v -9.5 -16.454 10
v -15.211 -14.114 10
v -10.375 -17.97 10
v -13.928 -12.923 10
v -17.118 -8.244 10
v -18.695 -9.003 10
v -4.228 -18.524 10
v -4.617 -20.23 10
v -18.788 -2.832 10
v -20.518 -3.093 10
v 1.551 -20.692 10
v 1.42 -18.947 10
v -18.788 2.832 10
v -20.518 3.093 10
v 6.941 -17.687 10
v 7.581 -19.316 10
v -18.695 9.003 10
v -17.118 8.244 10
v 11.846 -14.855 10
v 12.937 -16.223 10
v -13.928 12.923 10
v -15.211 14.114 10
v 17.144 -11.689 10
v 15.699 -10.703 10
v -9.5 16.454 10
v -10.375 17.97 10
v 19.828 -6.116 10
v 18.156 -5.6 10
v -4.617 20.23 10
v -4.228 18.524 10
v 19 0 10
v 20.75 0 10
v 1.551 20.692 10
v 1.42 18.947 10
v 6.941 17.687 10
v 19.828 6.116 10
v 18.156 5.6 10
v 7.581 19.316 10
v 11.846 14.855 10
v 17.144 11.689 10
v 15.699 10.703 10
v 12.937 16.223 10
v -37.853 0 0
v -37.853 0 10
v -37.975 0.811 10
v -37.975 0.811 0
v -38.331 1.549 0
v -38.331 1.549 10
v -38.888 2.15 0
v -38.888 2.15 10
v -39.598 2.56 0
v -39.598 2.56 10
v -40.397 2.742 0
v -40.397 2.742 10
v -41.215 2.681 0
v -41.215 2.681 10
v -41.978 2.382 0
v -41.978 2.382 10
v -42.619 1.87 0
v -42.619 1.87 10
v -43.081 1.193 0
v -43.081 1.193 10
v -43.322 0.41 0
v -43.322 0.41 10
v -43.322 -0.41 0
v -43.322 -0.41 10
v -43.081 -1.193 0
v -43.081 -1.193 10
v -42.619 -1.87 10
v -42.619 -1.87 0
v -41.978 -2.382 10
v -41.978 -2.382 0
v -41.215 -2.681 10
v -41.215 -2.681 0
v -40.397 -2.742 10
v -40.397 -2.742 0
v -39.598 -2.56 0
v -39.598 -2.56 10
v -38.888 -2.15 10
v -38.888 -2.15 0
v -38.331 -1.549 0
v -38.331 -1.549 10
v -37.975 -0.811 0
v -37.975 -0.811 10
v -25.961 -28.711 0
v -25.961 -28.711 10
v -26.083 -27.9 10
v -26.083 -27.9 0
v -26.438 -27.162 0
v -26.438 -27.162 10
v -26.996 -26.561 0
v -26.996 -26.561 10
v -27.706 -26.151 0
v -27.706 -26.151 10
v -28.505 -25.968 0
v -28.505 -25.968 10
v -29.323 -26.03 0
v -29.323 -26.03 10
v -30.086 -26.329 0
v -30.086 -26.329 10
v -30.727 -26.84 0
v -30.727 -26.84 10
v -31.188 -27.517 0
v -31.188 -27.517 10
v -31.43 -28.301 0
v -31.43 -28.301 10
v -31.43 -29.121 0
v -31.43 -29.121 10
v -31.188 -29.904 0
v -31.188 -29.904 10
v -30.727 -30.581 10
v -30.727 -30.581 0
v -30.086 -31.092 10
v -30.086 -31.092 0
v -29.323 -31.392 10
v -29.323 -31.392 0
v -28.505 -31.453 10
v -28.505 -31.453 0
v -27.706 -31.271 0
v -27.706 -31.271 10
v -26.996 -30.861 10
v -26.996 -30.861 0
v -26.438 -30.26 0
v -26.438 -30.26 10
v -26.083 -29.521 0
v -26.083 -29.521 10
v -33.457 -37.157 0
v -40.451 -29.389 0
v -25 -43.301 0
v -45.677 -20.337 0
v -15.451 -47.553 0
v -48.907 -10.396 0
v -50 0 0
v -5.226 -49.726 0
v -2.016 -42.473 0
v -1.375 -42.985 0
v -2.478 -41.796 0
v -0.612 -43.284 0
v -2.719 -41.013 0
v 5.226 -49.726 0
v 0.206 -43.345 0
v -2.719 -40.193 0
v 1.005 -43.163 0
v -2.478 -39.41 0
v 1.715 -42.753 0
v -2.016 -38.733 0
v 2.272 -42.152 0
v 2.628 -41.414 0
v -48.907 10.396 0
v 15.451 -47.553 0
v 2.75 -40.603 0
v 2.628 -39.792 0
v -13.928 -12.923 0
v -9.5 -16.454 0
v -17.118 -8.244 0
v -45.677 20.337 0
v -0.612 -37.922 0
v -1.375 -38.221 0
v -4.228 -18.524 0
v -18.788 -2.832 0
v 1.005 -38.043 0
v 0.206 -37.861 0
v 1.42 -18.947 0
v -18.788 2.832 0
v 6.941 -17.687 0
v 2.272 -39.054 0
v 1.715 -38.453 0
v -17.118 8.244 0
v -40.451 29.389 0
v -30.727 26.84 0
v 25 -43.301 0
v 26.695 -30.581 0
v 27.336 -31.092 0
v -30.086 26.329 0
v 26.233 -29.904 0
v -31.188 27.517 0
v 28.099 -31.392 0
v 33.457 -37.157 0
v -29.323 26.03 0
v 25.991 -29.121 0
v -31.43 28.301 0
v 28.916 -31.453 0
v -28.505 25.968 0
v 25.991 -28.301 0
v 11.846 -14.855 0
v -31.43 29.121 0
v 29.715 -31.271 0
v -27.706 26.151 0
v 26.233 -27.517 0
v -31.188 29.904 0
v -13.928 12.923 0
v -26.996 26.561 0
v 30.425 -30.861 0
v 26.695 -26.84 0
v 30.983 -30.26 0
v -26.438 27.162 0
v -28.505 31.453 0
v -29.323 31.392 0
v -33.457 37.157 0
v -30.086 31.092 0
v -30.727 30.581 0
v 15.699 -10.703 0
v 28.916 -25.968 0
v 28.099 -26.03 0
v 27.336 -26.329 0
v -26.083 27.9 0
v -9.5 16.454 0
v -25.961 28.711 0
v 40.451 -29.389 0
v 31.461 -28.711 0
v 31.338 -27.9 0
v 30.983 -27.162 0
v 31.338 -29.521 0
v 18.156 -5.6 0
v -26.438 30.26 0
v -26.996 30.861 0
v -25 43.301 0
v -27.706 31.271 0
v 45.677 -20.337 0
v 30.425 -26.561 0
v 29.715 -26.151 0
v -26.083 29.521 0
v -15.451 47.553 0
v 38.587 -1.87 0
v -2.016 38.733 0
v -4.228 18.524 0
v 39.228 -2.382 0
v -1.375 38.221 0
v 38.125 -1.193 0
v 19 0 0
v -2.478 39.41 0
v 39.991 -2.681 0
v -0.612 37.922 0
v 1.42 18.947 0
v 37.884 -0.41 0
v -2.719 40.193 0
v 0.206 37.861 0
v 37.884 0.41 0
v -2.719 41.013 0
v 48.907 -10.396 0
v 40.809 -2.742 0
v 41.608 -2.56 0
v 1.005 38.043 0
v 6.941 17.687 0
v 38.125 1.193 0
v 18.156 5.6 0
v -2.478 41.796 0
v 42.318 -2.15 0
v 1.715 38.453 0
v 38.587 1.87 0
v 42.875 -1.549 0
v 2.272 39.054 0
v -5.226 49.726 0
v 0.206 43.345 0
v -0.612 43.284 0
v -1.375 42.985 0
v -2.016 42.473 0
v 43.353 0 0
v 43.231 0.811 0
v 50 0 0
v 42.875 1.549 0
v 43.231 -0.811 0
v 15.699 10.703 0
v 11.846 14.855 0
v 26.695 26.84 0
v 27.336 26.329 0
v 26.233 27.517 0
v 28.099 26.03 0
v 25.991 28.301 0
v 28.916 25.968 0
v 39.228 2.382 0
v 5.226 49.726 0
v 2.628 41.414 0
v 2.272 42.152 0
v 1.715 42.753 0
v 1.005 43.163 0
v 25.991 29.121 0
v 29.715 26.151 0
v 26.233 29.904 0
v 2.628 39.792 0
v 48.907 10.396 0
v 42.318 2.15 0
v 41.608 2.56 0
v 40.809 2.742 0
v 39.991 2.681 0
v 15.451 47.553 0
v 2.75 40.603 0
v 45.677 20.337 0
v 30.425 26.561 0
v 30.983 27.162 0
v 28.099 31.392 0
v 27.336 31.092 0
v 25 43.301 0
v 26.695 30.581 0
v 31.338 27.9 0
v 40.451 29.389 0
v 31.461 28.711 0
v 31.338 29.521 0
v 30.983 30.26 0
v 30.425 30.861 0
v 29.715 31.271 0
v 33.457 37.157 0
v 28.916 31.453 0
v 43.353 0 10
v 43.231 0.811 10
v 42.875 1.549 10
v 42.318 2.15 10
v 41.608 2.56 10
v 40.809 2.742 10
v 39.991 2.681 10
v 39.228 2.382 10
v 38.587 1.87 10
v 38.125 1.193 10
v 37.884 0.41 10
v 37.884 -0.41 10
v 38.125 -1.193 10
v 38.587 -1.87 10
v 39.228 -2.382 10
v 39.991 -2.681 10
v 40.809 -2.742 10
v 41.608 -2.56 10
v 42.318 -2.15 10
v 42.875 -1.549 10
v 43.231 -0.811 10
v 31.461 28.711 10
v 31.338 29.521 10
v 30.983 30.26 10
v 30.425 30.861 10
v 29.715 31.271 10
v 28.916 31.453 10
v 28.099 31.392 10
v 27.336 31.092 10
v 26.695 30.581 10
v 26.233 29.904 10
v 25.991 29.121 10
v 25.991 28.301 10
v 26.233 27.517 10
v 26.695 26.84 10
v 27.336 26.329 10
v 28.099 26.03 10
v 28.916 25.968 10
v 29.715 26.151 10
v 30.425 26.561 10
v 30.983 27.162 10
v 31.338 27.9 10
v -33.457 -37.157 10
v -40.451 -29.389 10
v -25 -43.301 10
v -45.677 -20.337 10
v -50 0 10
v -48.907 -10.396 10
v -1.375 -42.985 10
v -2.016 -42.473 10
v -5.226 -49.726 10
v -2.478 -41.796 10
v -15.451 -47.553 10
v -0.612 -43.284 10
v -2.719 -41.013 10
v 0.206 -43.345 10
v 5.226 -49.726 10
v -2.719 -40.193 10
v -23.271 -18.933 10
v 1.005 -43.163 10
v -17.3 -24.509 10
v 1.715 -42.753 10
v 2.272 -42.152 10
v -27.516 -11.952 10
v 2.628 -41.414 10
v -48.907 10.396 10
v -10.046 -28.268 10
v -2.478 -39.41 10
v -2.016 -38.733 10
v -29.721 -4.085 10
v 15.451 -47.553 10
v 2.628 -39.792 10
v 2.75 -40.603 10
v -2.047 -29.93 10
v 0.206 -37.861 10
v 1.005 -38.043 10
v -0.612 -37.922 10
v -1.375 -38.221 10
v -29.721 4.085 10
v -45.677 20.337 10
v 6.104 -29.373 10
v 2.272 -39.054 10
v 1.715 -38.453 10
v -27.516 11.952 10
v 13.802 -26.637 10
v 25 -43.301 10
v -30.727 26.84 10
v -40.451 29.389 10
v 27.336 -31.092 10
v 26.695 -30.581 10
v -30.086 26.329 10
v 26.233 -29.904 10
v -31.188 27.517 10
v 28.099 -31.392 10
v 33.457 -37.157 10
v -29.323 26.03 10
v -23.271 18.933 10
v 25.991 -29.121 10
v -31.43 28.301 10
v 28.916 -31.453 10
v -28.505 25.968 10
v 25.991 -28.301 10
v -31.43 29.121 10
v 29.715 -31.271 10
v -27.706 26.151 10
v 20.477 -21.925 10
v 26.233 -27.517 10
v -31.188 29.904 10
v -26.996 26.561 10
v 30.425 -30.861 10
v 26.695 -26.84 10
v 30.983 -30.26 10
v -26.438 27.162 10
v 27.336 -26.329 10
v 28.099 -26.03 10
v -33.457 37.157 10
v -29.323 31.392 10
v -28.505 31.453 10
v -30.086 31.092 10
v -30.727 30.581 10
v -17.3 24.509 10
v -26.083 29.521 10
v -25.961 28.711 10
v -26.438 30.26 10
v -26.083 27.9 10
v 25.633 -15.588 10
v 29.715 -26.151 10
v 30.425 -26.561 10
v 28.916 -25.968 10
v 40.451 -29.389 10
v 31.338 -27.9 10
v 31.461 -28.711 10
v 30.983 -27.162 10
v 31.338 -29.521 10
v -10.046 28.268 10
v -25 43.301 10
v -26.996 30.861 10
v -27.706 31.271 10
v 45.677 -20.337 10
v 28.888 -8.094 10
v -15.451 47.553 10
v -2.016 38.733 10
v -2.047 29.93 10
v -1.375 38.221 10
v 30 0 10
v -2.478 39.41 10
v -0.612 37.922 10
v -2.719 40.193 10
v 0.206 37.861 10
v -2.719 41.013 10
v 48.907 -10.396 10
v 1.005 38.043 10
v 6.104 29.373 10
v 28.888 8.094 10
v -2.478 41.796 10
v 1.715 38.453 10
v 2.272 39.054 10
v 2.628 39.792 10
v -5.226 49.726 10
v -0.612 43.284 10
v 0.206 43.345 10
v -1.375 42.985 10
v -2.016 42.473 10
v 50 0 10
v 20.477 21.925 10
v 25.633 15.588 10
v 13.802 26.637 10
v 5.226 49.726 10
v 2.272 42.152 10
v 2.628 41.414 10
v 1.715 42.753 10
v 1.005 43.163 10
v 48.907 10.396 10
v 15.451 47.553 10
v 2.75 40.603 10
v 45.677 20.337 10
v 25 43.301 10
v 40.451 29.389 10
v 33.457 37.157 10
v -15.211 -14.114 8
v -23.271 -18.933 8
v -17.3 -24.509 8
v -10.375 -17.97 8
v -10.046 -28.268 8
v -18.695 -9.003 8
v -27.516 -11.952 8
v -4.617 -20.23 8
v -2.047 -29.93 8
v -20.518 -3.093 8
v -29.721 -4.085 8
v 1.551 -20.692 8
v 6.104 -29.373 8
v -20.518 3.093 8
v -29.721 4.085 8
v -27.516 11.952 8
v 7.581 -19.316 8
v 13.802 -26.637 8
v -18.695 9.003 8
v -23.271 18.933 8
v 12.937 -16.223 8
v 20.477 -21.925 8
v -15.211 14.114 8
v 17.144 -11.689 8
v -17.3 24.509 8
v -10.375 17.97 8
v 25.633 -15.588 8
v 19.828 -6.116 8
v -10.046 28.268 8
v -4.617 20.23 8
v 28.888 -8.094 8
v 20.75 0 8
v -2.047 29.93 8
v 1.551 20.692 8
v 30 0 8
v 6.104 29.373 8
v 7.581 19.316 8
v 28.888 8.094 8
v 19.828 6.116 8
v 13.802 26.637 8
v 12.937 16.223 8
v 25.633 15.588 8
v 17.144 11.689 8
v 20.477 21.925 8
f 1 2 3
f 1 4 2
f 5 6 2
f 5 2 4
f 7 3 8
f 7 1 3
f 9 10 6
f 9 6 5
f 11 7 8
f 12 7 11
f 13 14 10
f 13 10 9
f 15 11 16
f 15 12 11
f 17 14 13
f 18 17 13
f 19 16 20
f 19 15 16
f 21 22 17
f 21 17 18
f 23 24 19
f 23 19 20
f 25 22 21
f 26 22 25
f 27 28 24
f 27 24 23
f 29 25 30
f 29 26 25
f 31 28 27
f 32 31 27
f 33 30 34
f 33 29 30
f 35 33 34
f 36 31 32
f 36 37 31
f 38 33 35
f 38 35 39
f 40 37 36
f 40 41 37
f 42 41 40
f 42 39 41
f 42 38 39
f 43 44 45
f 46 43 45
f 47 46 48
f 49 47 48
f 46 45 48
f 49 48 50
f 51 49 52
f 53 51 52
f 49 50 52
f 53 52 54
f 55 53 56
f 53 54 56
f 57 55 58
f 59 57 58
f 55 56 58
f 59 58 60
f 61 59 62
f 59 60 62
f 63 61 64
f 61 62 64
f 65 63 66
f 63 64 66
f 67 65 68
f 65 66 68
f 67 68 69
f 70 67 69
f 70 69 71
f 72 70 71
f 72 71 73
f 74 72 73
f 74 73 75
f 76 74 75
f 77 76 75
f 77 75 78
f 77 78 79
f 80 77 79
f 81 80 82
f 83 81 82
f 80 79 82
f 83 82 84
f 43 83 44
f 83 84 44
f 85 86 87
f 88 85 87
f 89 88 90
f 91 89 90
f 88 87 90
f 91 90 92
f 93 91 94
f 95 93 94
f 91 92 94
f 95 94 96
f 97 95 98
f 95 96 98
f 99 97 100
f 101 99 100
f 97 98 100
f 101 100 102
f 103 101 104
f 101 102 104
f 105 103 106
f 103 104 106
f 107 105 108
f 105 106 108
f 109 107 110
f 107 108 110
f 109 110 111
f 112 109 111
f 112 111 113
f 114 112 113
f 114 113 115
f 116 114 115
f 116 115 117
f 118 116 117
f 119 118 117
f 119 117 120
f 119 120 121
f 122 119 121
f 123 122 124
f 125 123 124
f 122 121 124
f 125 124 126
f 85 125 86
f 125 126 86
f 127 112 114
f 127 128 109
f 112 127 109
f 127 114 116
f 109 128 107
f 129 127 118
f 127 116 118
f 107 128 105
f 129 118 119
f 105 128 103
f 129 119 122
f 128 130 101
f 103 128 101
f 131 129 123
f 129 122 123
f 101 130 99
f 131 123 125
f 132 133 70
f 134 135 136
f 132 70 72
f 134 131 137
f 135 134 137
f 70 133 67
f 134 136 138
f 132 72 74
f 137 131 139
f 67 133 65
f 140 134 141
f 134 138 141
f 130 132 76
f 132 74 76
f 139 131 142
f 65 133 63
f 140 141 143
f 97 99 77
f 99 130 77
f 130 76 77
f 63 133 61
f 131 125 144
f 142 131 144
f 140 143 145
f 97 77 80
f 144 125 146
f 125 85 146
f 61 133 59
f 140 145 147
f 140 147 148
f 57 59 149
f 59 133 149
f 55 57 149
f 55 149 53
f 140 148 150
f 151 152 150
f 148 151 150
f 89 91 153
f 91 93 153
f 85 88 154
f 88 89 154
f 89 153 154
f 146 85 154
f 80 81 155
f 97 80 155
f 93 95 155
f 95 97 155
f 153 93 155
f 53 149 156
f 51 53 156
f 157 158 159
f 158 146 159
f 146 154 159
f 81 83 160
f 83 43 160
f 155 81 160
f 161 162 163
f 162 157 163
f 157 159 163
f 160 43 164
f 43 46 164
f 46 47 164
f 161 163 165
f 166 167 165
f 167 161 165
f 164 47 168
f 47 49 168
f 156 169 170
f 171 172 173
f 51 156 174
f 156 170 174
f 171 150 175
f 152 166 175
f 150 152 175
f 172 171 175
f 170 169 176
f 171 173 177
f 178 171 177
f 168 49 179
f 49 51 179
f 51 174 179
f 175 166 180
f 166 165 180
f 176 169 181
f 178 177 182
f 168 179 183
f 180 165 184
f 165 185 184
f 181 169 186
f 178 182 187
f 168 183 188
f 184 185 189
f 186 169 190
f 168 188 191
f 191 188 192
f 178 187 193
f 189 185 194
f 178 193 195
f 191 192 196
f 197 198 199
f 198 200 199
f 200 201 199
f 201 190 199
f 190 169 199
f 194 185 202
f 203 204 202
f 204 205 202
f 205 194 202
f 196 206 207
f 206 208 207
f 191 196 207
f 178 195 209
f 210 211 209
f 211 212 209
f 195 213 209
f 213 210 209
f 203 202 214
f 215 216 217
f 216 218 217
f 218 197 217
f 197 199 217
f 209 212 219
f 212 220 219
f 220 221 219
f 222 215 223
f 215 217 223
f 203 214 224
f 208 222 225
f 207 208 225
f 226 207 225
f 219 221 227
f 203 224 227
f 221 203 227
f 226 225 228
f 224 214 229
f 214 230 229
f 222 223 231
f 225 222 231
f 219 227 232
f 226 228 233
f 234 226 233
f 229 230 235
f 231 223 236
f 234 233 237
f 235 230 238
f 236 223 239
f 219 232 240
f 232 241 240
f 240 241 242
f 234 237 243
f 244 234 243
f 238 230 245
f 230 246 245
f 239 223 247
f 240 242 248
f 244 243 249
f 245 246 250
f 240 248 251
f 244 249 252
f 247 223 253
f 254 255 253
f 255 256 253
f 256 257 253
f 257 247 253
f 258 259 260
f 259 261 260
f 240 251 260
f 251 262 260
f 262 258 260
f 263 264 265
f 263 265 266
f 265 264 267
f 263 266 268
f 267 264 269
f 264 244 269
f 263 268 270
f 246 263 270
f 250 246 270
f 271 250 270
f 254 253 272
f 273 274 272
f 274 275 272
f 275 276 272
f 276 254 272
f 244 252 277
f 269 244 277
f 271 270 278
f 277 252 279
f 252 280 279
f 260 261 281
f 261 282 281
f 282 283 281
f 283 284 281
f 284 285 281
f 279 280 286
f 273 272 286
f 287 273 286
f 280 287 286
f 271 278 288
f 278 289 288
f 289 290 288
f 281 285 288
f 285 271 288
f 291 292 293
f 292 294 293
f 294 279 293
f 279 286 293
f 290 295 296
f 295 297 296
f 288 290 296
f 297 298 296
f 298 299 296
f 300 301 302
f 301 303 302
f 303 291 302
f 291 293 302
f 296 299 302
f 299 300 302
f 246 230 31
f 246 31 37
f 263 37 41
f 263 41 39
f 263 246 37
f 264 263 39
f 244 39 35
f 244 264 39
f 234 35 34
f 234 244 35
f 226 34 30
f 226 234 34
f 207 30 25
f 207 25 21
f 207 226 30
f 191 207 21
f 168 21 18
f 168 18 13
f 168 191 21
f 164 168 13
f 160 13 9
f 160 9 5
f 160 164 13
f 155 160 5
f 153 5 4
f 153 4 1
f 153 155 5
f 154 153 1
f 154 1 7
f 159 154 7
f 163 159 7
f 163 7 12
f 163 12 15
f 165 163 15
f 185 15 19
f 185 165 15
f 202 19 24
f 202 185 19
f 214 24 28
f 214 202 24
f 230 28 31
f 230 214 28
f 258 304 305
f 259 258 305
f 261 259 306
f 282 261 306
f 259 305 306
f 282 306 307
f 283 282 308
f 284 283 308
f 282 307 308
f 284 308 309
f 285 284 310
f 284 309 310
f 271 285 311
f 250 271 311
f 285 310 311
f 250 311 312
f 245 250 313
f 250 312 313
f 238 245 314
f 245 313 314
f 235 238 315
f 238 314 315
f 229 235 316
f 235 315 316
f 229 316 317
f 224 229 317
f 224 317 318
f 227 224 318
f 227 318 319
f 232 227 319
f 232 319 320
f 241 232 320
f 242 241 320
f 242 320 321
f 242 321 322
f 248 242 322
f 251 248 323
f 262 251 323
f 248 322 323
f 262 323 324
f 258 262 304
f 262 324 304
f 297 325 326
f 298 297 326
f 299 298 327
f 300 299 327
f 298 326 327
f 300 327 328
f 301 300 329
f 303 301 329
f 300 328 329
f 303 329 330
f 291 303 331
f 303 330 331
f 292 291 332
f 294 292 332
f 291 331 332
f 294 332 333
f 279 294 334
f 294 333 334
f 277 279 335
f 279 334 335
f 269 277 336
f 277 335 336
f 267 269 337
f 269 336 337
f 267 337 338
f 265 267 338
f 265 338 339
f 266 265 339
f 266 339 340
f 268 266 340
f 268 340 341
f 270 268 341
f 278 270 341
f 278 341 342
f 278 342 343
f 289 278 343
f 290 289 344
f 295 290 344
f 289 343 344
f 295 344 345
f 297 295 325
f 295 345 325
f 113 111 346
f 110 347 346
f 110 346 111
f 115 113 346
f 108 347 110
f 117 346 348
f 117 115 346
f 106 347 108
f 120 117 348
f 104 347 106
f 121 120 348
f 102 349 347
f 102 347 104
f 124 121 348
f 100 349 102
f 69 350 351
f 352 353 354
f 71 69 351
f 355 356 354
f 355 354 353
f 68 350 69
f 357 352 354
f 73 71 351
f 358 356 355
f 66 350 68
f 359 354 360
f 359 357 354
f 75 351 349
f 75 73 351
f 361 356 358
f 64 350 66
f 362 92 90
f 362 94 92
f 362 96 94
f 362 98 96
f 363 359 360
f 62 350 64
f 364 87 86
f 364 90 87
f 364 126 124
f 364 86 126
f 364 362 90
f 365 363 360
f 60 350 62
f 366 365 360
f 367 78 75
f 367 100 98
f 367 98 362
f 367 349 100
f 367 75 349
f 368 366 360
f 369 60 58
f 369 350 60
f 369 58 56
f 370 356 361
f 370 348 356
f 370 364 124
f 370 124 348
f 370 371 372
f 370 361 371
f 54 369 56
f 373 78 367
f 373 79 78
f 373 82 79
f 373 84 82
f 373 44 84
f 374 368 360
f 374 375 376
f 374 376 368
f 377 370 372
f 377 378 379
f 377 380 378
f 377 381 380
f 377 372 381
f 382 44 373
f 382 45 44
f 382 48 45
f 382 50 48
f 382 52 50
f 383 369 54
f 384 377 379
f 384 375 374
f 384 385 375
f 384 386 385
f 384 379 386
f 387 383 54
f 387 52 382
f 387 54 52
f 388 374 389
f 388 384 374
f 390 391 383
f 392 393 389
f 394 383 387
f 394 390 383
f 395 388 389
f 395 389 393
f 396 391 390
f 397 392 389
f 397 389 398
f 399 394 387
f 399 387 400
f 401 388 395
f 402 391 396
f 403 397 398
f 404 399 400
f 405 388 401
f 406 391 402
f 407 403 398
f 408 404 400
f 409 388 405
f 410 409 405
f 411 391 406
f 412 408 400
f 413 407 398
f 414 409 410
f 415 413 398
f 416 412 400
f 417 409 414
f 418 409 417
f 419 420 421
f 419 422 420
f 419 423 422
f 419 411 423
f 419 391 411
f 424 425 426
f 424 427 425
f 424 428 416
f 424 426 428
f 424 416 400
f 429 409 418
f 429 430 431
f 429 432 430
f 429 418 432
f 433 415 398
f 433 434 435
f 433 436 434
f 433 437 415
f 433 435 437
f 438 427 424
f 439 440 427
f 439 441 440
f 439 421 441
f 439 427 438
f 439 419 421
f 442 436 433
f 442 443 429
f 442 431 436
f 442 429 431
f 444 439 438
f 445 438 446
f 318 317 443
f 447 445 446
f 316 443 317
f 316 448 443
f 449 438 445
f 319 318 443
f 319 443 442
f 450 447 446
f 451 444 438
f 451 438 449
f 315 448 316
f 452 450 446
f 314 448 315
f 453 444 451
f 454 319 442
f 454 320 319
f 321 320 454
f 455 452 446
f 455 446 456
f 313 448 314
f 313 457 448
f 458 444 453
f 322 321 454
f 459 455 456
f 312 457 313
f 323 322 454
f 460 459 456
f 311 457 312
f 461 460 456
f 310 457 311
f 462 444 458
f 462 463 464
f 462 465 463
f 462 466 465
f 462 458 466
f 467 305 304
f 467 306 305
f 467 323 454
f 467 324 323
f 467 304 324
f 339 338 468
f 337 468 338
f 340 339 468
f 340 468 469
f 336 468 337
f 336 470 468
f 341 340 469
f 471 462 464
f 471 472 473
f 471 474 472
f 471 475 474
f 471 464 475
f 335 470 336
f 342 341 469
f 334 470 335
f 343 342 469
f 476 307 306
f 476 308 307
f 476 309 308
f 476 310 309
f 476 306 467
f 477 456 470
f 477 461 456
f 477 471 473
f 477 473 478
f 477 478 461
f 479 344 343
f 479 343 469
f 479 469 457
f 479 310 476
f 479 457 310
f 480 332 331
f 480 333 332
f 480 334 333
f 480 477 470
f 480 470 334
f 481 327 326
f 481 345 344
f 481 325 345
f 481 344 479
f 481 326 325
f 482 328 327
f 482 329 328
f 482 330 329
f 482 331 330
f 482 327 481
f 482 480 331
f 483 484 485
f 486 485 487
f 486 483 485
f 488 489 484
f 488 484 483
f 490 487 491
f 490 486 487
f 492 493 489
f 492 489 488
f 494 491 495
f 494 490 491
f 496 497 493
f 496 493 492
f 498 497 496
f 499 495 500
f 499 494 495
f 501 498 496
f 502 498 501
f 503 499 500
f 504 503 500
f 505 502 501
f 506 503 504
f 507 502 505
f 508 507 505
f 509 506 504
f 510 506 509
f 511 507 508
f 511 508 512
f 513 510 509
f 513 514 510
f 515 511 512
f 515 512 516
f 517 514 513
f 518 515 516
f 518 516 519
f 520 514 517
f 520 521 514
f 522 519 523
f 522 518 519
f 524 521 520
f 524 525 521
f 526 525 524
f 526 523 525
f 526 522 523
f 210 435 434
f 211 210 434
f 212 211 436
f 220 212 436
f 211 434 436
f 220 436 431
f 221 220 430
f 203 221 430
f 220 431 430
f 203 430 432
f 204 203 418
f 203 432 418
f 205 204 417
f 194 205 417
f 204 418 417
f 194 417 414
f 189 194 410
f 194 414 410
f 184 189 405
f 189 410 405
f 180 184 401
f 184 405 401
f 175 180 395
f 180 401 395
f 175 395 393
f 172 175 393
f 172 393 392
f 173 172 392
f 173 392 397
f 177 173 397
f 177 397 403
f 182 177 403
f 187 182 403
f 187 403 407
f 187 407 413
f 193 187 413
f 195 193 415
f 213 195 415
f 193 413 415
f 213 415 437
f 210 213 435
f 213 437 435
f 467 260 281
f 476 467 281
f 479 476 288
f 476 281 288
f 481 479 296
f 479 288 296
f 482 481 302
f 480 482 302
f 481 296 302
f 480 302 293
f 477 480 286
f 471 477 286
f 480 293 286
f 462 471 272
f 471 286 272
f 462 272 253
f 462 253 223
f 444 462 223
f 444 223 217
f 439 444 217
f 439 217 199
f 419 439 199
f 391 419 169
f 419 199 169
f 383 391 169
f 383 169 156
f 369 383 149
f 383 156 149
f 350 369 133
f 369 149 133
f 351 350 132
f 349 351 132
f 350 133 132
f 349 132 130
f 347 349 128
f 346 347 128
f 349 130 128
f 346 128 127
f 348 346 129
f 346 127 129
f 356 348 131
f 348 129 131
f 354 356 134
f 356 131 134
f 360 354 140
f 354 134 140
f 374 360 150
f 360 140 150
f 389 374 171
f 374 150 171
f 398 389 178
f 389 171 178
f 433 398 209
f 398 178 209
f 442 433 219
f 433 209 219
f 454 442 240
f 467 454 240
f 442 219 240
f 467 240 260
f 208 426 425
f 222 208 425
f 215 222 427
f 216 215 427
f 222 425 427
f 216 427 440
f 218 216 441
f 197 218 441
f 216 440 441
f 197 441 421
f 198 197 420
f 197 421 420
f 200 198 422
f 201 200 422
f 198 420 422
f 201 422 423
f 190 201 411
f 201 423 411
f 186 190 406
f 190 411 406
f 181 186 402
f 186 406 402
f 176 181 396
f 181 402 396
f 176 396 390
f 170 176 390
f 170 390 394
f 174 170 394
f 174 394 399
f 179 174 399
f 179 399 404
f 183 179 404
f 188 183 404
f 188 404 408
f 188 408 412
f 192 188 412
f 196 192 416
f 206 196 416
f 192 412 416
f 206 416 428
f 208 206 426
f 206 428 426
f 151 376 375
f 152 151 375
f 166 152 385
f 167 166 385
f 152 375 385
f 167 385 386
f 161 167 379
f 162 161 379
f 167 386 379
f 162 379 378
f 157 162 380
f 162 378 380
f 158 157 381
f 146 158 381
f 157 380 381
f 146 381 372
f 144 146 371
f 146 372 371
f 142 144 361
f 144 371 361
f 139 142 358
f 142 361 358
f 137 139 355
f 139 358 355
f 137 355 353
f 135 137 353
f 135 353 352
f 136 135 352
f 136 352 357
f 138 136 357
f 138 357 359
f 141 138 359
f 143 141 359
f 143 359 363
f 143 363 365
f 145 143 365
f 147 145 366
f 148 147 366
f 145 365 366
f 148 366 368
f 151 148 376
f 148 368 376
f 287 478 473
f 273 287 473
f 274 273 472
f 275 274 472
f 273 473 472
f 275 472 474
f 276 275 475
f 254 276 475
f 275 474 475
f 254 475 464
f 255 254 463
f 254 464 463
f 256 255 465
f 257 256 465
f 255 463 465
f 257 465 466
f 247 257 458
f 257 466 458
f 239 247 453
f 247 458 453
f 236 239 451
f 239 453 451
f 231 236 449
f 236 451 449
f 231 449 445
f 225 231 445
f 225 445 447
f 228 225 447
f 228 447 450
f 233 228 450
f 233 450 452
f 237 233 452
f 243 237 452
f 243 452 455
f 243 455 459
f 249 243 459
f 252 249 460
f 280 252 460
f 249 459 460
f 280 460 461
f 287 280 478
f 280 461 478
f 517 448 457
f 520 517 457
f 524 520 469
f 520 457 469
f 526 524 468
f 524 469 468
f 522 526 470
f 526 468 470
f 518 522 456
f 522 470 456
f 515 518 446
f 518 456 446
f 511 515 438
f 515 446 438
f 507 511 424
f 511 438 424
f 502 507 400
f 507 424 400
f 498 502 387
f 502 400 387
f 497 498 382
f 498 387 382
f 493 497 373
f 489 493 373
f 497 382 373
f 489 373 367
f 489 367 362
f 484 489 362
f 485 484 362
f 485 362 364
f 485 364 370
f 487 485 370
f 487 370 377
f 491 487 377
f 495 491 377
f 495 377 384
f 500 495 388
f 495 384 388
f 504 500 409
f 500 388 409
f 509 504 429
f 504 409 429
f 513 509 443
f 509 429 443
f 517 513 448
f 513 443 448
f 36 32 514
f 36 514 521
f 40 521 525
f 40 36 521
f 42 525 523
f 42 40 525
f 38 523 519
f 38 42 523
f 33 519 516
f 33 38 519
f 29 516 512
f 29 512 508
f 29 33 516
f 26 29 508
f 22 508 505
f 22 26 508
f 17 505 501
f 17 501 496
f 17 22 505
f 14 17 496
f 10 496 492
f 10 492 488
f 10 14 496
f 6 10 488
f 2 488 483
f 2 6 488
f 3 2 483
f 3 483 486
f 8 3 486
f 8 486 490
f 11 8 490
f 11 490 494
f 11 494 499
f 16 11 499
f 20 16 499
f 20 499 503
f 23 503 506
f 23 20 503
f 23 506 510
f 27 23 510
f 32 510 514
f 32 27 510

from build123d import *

# Parameters (mm, degrees)
CROQUIS1_R              = 50
CROQUIS1_R_2            = 19
SALIENTE_EXTRUIR1_DEPTH = 10
CROQUIS4_R              = 30
CROQUIS4_R_2            = 20.75
CORTAR_EXTRUIR1_DEPTH   = 2
CROQUIS5_R              = 2.75
CORTAR_EXTRUIR2_DEPTH   = 10


with BuildPart() as part:
    # Croquis1 → Saliente-Extruir1 (new body)
    with BuildSketch(Plane.XY):
        Circle(CROQUIS1_R)
        Circle(CROQUIS1_R_2, mode=Mode.SUBTRACT)
    extrude(amount=SALIENTE_EXTRUIR1_DEPTH)

    # Croquis4 → Cortar-Extruir1 (cut)
    with BuildSketch(Plane.XY.offset(10)):
        Circle(CROQUIS4_R)
        Circle(CROQUIS4_R_2, mode=Mode.SUBTRACT)
    extrude(amount=-CORTAR_EXTRUIR1_DEPTH, mode=Mode.SUBTRACT)

    # Croquis5 → Cortar-Extruir2 (cut)
    with BuildSketch(Plane.XY.offset(10)):
        with Locations((40.602997929, 0)):
            Circle(CROQUIS5_R)
        with Locations((28.710655172, -28.710655172)):
            Circle(CROQUIS5_R)
        with Locations((0, -40.602997929)):
            Circle(CROQUIS5_R)
        with Locations((-28.710655172, -28.710655172)):
            Circle(CROQUIS5_R)
        with Locations((-40.602997929, 0)):
            Circle(CROQUIS5_R)
        with Locations((-28.710655172, 28.710655172)):
            Circle(CROQUIS5_R)
        with Locations((0, 40.602997929)):
            Circle(CROQUIS5_R)
        with Locations((28.710655172, 28.710655172)):
            Circle(CROQUIS5_R)
    extrude(amount=-CORTAR_EXTRUIR2_DEPTH, mode=Mode.SUBTRACT)


solid = part.part
